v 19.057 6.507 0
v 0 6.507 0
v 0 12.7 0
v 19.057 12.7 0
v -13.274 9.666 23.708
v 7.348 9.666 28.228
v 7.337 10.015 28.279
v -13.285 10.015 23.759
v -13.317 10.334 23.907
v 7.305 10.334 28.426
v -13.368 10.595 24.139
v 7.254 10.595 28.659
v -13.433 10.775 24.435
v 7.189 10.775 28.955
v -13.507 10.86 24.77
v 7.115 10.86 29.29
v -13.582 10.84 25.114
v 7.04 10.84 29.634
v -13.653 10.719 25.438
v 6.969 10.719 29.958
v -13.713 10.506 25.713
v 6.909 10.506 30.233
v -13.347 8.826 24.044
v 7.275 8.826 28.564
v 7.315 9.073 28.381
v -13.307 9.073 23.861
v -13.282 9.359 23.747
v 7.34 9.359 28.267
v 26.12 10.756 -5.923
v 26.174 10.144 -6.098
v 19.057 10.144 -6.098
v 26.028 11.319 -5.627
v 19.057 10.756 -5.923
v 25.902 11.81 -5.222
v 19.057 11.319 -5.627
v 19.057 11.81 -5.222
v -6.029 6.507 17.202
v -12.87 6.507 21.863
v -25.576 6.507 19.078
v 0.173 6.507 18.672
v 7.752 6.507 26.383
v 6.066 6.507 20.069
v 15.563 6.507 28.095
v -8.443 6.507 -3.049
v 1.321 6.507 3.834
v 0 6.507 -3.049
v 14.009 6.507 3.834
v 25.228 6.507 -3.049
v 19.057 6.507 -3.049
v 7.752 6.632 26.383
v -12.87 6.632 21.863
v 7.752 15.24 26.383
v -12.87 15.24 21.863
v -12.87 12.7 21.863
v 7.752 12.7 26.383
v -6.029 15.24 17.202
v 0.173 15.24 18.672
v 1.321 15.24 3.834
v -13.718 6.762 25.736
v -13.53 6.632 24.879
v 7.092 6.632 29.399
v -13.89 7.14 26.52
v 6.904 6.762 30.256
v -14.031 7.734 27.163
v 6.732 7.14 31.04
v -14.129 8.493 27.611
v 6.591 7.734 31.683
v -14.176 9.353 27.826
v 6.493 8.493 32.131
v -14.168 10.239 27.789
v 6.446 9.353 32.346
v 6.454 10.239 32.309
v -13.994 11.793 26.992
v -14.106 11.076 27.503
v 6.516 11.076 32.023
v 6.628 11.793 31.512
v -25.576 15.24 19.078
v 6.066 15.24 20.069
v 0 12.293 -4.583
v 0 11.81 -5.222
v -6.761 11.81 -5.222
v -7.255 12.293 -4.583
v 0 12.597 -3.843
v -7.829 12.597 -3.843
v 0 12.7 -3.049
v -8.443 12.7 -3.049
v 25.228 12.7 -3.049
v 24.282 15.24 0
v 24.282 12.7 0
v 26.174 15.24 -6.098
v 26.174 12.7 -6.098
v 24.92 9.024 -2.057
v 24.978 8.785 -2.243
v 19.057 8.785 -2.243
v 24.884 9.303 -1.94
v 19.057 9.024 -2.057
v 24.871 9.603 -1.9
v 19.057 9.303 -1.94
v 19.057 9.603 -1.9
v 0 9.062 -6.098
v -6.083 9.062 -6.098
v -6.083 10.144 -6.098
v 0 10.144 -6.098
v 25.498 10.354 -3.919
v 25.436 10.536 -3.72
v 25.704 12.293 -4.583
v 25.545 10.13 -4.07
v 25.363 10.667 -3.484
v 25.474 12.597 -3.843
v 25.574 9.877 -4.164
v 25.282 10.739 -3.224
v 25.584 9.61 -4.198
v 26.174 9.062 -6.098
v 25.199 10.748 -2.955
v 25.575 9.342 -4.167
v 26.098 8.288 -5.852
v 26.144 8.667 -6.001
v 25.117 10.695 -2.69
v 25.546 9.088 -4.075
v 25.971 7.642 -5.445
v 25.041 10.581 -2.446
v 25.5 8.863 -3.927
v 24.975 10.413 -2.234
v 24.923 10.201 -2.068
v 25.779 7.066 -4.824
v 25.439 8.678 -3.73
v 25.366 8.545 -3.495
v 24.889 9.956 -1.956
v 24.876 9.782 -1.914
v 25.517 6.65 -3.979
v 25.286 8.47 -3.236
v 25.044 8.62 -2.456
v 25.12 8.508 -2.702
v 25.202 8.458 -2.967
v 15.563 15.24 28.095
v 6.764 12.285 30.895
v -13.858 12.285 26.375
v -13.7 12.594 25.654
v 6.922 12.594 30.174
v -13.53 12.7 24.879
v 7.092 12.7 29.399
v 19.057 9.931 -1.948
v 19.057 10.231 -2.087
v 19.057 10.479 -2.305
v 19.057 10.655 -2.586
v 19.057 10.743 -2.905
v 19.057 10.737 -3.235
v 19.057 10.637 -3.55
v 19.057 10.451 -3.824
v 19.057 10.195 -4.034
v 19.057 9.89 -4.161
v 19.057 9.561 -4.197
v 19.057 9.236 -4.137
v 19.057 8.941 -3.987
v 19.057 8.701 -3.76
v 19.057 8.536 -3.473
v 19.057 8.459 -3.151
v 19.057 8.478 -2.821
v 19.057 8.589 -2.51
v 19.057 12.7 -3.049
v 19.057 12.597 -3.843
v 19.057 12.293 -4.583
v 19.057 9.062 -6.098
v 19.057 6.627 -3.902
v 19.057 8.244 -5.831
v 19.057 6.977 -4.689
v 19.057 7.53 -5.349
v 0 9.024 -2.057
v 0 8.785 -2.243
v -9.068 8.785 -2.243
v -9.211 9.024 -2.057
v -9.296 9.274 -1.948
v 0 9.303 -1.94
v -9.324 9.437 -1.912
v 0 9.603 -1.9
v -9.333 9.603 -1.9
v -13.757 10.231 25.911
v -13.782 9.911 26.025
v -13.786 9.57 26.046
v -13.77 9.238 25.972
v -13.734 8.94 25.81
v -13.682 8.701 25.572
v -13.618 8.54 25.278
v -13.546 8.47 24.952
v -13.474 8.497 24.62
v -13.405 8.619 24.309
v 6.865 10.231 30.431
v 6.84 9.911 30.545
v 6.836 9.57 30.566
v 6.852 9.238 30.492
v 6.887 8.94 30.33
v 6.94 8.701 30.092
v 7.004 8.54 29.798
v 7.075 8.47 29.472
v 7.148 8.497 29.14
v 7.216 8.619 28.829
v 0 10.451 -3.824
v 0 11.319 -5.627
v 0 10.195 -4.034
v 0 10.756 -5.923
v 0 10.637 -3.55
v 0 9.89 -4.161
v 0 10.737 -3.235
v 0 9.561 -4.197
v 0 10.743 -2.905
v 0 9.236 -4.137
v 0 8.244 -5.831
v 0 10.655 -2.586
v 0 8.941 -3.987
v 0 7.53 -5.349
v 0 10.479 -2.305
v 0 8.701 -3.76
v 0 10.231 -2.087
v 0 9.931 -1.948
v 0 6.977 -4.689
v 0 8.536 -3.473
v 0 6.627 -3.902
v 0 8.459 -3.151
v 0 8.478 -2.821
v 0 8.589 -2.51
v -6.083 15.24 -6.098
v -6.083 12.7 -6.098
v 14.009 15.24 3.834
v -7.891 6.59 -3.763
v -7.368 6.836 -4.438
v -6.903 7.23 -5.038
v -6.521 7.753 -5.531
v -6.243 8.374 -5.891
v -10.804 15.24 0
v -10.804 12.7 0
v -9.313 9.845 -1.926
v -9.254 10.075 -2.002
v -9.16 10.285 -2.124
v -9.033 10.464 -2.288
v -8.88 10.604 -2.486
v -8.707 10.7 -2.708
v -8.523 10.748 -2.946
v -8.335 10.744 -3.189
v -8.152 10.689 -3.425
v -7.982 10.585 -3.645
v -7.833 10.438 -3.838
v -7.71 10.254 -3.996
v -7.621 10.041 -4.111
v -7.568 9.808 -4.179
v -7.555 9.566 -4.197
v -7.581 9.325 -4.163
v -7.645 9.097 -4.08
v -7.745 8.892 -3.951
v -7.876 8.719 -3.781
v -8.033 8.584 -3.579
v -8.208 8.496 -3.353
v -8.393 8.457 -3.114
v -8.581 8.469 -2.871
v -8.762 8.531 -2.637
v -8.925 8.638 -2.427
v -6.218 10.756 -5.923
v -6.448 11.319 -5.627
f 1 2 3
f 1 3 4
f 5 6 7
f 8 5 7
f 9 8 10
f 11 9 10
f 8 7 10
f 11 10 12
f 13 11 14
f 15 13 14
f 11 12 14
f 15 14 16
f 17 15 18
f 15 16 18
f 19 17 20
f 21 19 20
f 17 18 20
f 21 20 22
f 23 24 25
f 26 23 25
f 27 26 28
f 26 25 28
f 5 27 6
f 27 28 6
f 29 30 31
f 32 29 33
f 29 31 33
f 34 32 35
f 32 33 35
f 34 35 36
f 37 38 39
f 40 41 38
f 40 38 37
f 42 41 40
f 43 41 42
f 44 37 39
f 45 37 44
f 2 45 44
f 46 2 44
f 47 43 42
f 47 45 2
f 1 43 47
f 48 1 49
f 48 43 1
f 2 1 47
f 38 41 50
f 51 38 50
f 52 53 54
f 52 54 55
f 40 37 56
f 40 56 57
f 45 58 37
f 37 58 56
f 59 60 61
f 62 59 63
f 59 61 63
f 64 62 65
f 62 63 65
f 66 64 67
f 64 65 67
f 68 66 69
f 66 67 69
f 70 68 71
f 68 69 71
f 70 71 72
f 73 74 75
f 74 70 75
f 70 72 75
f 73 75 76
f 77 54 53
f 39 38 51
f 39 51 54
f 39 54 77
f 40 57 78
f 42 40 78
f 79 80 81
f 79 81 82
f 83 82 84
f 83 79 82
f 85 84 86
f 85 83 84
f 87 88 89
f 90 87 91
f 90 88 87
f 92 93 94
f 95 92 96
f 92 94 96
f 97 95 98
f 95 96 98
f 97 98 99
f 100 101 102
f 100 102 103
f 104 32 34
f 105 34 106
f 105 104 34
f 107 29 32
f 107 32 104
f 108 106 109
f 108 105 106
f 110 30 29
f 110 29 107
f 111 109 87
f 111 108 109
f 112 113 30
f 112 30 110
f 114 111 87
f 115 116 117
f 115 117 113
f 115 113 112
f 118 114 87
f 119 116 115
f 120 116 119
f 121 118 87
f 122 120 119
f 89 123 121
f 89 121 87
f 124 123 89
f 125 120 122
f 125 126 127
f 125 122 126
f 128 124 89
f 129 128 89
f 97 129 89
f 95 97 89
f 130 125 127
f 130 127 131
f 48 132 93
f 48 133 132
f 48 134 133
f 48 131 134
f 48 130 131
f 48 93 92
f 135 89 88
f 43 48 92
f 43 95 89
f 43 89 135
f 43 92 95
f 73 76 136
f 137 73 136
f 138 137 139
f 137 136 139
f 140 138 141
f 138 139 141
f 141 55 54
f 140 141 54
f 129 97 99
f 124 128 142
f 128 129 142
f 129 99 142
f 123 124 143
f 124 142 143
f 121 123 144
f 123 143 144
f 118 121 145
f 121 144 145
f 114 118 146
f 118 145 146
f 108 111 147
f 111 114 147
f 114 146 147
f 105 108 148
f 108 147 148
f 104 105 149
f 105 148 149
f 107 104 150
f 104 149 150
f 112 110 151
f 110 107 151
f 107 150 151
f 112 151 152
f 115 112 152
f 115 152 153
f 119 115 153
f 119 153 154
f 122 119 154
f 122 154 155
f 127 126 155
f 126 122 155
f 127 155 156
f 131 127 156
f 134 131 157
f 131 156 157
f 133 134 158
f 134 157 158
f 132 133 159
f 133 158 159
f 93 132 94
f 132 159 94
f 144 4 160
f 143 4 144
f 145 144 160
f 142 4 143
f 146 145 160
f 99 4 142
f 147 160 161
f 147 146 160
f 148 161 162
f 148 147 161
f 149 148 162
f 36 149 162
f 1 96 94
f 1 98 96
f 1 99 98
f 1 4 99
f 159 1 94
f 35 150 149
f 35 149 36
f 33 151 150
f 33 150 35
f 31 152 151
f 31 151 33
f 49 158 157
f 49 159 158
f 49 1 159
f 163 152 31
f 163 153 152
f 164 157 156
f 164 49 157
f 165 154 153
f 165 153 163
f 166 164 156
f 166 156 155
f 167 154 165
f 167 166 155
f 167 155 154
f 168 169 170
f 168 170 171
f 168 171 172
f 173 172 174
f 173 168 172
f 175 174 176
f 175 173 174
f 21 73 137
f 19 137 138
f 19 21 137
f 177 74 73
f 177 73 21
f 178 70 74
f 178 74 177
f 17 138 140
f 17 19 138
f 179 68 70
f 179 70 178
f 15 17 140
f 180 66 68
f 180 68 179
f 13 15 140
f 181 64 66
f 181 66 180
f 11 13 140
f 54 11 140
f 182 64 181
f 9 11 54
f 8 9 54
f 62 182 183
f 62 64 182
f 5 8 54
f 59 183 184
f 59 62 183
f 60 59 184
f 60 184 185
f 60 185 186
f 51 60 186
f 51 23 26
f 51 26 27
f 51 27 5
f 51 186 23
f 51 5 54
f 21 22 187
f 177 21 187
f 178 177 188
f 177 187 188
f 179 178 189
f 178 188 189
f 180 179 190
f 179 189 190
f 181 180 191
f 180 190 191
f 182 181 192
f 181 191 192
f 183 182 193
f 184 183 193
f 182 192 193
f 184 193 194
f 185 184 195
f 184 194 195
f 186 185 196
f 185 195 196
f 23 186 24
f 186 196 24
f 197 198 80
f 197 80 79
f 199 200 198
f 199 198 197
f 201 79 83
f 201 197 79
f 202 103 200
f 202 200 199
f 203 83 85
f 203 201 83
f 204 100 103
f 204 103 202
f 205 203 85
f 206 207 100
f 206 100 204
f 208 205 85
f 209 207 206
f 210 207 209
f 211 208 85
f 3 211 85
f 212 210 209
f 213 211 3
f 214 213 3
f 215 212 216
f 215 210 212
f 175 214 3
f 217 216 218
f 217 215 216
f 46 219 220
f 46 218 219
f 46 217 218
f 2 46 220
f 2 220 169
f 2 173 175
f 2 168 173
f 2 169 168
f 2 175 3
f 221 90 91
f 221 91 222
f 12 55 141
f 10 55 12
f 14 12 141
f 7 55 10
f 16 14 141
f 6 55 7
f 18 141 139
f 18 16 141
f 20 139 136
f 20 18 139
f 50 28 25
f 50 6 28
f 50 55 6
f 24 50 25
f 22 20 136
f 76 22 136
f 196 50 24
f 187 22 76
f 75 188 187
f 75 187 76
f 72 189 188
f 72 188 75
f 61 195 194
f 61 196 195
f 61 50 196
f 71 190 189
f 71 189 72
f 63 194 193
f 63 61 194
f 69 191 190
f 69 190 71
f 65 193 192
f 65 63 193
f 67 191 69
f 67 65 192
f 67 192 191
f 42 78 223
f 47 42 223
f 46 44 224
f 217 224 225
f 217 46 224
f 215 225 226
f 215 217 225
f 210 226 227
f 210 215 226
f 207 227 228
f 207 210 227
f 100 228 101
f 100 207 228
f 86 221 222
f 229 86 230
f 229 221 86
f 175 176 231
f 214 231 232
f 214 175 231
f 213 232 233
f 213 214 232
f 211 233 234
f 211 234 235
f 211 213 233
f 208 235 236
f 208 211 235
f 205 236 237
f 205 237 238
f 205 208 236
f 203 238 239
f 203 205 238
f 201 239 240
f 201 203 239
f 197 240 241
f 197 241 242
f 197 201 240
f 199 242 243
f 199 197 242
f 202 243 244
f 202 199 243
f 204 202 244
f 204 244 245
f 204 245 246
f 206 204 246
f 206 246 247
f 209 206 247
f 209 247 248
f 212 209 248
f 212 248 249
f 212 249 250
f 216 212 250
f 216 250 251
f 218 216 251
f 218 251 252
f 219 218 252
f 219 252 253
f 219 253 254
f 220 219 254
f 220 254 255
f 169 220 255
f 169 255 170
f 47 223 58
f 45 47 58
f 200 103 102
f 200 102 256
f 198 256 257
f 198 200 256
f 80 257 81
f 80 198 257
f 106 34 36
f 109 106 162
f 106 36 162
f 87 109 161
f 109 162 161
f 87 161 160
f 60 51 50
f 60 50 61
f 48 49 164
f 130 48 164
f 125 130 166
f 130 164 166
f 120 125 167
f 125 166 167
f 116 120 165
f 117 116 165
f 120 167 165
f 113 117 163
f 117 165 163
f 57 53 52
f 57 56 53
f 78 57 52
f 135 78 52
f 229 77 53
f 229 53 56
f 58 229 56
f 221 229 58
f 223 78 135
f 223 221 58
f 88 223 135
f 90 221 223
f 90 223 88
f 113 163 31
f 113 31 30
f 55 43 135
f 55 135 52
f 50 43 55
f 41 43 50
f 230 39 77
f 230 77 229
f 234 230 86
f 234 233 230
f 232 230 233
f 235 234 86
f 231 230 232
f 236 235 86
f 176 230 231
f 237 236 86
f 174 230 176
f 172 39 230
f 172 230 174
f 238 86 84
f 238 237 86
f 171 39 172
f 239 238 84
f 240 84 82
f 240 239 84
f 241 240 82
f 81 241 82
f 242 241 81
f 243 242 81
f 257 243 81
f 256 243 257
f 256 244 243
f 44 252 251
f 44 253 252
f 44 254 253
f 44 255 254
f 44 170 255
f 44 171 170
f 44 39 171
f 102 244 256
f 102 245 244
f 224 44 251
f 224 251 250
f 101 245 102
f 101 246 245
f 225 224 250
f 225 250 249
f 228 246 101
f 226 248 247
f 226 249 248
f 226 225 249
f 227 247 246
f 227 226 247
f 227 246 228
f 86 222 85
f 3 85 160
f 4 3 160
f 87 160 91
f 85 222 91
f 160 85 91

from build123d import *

# Parameters (mm, degrees)
BOSS_EXTRUDE1_DEPTH     = 15.24
CUT_EXTRUDE2_DEPTH      = 2.54
CUT_EXTRUDE3_DEPTH      = 26.416
CUT_EXTRUDE4_DEPTH      = 2.54
CUT_EXTRUDE5_DEPTH      = 37.592
CUT_EXTRUDE5_DEPTH_BACK = 16.256
SKETCH6_W               = 28.095448716
SKETCH6_H               = 6.506871402
CUT_EXTRUDE6_DEPTH      = 33.782
CUT_EXTRUDE6_DEPTH_BACK = 30.988
CUT_EXTRUDE7_DEPTH      = 30.988
BOSS_EXTRUDE2_DEPTH     = 2.54


with BuildPart() as part:
    # Sketch1 → Boss-Extrude1 (new body)
    with BuildSketch(Plane(origin=(0, 0, 0), x_dir=(1, 0, 0), z_dir=(0, 1, 0))):
        Polygon((0, 0), (19.056811247, 0), (19.056811247, 6.097892911), (26.173997358, 6.097892911), (15.563225472, -28.095448716), (7.752418672, -26.383450539), (6.430712527, -32.413592092), (-14.191226065, -27.893608153), (-12.86951992, -21.8634666), (-25.576280295, -19.078357307), (-6.082744599, 6.097892911), (0, 6.097892911), align=None)
    extrude(amount=BOSS_EXTRUDE1_DEPTH)

    # Sketch2 → Cut-Extrude2 (cut)
    with BuildSketch(Plane(origin=(0, 15.24, 0), x_dir=(1, 0, 0), z_dir=(0, 1, 0))):
        Polygon((-12.86951992, -21.8634666), (7.752418672, -26.383450539), (6.430712527, -32.413592092), (-14.191226065, -27.893608153), align=None)
    extrude(amount=-CUT_EXTRUDE2_DEPTH, mode=Mode.SUBTRACT)

    # Sketch3 → Cut-Extrude3 (cut)
    with BuildSketch(Plane(origin=(12.914786435, 0, 2.830705125), x_dir=(0.214100757, 0, -0.976811582), z_dir=(0.976811582, 0, 0.214100757))):
        with BuildLine():
            Line((-29.362167954, 11.792818882), (-30.285151737, 12.7))
            Line((-30.285151737, 12.7), (-30.285151737, 6.632404251))
            Line((-30.285151737, 6.632404251), (-27.19850654, 6.632404251))
            ThreePointArc((-27.19850654, 6.632404251), (-29.99633203, 8.493128354), (-29.362167954, 11.792818882))
        make_face()
        with BuildLine():
            Line((-27.19850654, 12.7), (-30.285151737, 12.7))
            Line((-30.285151737, 12.7), (-29.362167954, 11.792818882))
            ThreePointArc((-29.362167954, 11.792818882), (-28.371580312, 12.464027615), (-27.19850654, 12.7))
        make_face()
        with BuildLine():
            ThreePointArc((-25.999973236, 9.666202125), (-26.744632367, 10.775472298), (-28.053283414, 10.506344124))
            Line((-28.053283414, 10.506344124), (-26.343729666, 8.826060127))
            ThreePointArc((-26.343729666, 8.826060127), (-26.089236367, 9.212327952), (-25.999973236, 9.666202125))
        make_face()
        with BuildLine():
            Line((-26.343729666, 8.826060127), (-28.053283414, 10.506344124))
            ThreePointArc((-28.053283414, 10.506344124), (-28.038648539, 8.811425251), (-26.343729666, 8.826060127))
        make_face()
        Polygon((-27.19850654, 6.632404251), (-30.285151737, 6.632404251), (-30.285151737, 0), (-24.111861344, 0), (-24.111861344, 6.632404251), align=None)
    extrude(amount=-CUT_EXTRUDE3_DEPTH, mode=Mode.SUBTRACT)

    # Sketch4 → Cut-Extrude4 (cut)
    with BuildSketch(Plane(origin=(0, 15.24, 0), x_dir=(1, 0, 0), z_dir=(0, 1, 0))):
        Polygon((0, 0), (0, 6.097892911), (-6.082744599, 6.097892911), (-10.804237756, 0), align=None)
        Polygon((19.056811247, 0), (24.281718113, 0), (26.173997358, 6.097892911), (19.056811247, 6.097892911), align=None)
    extrude(amount=-CUT_EXTRUDE4_DEPTH, mode=Mode.SUBTRACT)

    # Sketch5 → Cut-Extrude5 (cut, two sides)
    with BuildSketch(Plane.ZY.offset(-19.056811247)) as cut_extrude5_sk:
        with BuildLine():
            ThreePointArc((-1.900262012, 9.603435701), (-2.605255865, 10.662970793), (-3.854871247, 10.421947266))
            Line((-3.854871247, 10.421947266), (-2.243021664, 8.784924136))
            ThreePointArc((-2.243021664, 8.784924136), (-1.989411364, 9.15974511), (-1.900262012, 9.603435701))
        make_face()
        with BuildLine():
            Line((-2.243021664, 8.784924136), (-3.854871247, 10.421947266))
            ThreePointArc((-3.854871247, 10.421947266), (-3.867458021, 8.79751091), (-2.243021664, 8.784924136))
        make_face()
        with BuildLine():
            ThreePointArc((-3.048946456, 6.506871402), (-5.038116892, 7.230270846), (-6.097892911, 9.062477322))
            Line((-6.097892911, 9.062477322), (-6.097892911, 6.506871402))
            Line((-6.097892911, 6.506871402), (-3.048946456, 6.506871402))
        make_face()
        Polygon((-3.048946456, 6.506871402), (-6.097892911, 6.506871402), (-6.097892911, 0), (0, 0), (0, 6.506871402), align=None)
        with BuildLine():
            Line((-5.221516955, 11.809936977), (-6.097892911, 12.7))
            Line((-6.097892911, 12.7), (-6.097892911, 10.14439408))
            ThreePointArc((-6.097892911, 10.14439408), (-5.789305577, 11.045358842), (-5.221516955, 11.809936977))
        make_face()
        with BuildLine():
            Line((-3.048946456, 12.7), (-6.097892911, 12.7))
            Line((-6.097892911, 12.7), (-5.221516955, 11.809936977))
            ThreePointArc((-5.221516955, 11.809936977), (-4.22285816, 12.468857444), (-3.048946456, 12.7))
        make_face()
    extrude(amount=CUT_EXTRUDE5_DEPTH, mode=Mode.SUBTRACT)
    extrude(cut_extrude5_sk.sketch, amount=-CUT_EXTRUDE5_DEPTH_BACK, mode=Mode.SUBTRACT)

    # Sketch6 → Cut-Extrude6 (cut, two sides)
    with BuildSketch(Plane(origin=(0, 0, 0), x_dir=(0, 0, -1), z_dir=(1, 0, 0))) as cut_extrude6_sk:
        with Locations((-14.047724358, 3.253435701)):
            Rectangle(SKETCH6_W, SKETCH6_H)
    extrude(amount=CUT_EXTRUDE6_DEPTH, mode=Mode.SUBTRACT)
    extrude(cut_extrude6_sk.sketch, amount=-CUT_EXTRUDE6_DEPTH_BACK, mode=Mode.SUBTRACT)

    # Sketch7 → Cut-Extrude7 (cut)
    with BuildSketch(Plane(origin=(0, 15.24, 0), x_dir=(1, 0, 0), z_dir=(0, 1, 0))):
        Polygon((14.008950707, -3.834200977), (7.607295542, -3.834200977), (0.172703368, -18.672351511), (6.066325192, -20.069477121), align=None)
        Polygon((0.172703368, -18.672351511), (7.607295542, -3.834200977), (1.320524054, -3.834200977), (-6.028876319, -17.202222267), align=None)
    extrude(amount=-CUT_EXTRUDE7_DEPTH, mode=Mode.SUBTRACT)

    # Sketch8 → Boss-Extrude2 (add)
    with BuildSketch(Plane(origin=(0, 15.24, 0), x_dir=(1, 0, 0), z_dir=(0, 1, 0))):
        Polygon((-10.804237756, 0), (24.281718113, 0), (26.173997358, 6.097892911), (-6.082744599, 6.097892911), align=None)
    extrude(amount=-BOSS_EXTRUDE2_DEPTH)


solid = part.part
